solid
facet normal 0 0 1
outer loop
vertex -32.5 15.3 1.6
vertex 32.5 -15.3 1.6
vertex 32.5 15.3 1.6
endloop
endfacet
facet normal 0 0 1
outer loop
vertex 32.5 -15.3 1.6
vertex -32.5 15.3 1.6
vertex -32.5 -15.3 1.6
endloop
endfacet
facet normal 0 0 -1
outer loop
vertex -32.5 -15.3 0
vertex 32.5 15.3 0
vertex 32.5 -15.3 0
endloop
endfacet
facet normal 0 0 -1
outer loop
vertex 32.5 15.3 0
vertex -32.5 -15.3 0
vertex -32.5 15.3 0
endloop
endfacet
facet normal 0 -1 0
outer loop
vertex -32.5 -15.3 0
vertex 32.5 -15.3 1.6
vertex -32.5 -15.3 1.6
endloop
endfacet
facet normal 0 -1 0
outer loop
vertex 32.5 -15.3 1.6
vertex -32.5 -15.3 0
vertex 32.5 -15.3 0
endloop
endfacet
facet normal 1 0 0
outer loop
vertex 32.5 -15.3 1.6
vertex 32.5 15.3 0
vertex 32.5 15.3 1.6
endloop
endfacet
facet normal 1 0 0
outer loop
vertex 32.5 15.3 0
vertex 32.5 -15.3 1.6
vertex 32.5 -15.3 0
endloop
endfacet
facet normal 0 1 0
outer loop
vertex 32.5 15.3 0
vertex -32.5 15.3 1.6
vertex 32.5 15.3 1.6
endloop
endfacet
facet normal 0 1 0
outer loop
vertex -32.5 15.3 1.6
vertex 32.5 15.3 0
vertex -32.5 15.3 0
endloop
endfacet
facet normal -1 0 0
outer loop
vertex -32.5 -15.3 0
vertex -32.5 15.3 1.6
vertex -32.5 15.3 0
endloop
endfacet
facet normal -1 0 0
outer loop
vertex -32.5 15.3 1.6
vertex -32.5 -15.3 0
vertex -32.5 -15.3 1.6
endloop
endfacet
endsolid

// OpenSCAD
$fn=64;

board_len = 65.0;
board_wid = 30.6;
board_thk = 1.6;

module sensor_board(l=board_len, w=board_wid, t=board_thk){
    translate([0,0,t/2])
        cube([l,w,t], center=true);
}

sensor_board();
